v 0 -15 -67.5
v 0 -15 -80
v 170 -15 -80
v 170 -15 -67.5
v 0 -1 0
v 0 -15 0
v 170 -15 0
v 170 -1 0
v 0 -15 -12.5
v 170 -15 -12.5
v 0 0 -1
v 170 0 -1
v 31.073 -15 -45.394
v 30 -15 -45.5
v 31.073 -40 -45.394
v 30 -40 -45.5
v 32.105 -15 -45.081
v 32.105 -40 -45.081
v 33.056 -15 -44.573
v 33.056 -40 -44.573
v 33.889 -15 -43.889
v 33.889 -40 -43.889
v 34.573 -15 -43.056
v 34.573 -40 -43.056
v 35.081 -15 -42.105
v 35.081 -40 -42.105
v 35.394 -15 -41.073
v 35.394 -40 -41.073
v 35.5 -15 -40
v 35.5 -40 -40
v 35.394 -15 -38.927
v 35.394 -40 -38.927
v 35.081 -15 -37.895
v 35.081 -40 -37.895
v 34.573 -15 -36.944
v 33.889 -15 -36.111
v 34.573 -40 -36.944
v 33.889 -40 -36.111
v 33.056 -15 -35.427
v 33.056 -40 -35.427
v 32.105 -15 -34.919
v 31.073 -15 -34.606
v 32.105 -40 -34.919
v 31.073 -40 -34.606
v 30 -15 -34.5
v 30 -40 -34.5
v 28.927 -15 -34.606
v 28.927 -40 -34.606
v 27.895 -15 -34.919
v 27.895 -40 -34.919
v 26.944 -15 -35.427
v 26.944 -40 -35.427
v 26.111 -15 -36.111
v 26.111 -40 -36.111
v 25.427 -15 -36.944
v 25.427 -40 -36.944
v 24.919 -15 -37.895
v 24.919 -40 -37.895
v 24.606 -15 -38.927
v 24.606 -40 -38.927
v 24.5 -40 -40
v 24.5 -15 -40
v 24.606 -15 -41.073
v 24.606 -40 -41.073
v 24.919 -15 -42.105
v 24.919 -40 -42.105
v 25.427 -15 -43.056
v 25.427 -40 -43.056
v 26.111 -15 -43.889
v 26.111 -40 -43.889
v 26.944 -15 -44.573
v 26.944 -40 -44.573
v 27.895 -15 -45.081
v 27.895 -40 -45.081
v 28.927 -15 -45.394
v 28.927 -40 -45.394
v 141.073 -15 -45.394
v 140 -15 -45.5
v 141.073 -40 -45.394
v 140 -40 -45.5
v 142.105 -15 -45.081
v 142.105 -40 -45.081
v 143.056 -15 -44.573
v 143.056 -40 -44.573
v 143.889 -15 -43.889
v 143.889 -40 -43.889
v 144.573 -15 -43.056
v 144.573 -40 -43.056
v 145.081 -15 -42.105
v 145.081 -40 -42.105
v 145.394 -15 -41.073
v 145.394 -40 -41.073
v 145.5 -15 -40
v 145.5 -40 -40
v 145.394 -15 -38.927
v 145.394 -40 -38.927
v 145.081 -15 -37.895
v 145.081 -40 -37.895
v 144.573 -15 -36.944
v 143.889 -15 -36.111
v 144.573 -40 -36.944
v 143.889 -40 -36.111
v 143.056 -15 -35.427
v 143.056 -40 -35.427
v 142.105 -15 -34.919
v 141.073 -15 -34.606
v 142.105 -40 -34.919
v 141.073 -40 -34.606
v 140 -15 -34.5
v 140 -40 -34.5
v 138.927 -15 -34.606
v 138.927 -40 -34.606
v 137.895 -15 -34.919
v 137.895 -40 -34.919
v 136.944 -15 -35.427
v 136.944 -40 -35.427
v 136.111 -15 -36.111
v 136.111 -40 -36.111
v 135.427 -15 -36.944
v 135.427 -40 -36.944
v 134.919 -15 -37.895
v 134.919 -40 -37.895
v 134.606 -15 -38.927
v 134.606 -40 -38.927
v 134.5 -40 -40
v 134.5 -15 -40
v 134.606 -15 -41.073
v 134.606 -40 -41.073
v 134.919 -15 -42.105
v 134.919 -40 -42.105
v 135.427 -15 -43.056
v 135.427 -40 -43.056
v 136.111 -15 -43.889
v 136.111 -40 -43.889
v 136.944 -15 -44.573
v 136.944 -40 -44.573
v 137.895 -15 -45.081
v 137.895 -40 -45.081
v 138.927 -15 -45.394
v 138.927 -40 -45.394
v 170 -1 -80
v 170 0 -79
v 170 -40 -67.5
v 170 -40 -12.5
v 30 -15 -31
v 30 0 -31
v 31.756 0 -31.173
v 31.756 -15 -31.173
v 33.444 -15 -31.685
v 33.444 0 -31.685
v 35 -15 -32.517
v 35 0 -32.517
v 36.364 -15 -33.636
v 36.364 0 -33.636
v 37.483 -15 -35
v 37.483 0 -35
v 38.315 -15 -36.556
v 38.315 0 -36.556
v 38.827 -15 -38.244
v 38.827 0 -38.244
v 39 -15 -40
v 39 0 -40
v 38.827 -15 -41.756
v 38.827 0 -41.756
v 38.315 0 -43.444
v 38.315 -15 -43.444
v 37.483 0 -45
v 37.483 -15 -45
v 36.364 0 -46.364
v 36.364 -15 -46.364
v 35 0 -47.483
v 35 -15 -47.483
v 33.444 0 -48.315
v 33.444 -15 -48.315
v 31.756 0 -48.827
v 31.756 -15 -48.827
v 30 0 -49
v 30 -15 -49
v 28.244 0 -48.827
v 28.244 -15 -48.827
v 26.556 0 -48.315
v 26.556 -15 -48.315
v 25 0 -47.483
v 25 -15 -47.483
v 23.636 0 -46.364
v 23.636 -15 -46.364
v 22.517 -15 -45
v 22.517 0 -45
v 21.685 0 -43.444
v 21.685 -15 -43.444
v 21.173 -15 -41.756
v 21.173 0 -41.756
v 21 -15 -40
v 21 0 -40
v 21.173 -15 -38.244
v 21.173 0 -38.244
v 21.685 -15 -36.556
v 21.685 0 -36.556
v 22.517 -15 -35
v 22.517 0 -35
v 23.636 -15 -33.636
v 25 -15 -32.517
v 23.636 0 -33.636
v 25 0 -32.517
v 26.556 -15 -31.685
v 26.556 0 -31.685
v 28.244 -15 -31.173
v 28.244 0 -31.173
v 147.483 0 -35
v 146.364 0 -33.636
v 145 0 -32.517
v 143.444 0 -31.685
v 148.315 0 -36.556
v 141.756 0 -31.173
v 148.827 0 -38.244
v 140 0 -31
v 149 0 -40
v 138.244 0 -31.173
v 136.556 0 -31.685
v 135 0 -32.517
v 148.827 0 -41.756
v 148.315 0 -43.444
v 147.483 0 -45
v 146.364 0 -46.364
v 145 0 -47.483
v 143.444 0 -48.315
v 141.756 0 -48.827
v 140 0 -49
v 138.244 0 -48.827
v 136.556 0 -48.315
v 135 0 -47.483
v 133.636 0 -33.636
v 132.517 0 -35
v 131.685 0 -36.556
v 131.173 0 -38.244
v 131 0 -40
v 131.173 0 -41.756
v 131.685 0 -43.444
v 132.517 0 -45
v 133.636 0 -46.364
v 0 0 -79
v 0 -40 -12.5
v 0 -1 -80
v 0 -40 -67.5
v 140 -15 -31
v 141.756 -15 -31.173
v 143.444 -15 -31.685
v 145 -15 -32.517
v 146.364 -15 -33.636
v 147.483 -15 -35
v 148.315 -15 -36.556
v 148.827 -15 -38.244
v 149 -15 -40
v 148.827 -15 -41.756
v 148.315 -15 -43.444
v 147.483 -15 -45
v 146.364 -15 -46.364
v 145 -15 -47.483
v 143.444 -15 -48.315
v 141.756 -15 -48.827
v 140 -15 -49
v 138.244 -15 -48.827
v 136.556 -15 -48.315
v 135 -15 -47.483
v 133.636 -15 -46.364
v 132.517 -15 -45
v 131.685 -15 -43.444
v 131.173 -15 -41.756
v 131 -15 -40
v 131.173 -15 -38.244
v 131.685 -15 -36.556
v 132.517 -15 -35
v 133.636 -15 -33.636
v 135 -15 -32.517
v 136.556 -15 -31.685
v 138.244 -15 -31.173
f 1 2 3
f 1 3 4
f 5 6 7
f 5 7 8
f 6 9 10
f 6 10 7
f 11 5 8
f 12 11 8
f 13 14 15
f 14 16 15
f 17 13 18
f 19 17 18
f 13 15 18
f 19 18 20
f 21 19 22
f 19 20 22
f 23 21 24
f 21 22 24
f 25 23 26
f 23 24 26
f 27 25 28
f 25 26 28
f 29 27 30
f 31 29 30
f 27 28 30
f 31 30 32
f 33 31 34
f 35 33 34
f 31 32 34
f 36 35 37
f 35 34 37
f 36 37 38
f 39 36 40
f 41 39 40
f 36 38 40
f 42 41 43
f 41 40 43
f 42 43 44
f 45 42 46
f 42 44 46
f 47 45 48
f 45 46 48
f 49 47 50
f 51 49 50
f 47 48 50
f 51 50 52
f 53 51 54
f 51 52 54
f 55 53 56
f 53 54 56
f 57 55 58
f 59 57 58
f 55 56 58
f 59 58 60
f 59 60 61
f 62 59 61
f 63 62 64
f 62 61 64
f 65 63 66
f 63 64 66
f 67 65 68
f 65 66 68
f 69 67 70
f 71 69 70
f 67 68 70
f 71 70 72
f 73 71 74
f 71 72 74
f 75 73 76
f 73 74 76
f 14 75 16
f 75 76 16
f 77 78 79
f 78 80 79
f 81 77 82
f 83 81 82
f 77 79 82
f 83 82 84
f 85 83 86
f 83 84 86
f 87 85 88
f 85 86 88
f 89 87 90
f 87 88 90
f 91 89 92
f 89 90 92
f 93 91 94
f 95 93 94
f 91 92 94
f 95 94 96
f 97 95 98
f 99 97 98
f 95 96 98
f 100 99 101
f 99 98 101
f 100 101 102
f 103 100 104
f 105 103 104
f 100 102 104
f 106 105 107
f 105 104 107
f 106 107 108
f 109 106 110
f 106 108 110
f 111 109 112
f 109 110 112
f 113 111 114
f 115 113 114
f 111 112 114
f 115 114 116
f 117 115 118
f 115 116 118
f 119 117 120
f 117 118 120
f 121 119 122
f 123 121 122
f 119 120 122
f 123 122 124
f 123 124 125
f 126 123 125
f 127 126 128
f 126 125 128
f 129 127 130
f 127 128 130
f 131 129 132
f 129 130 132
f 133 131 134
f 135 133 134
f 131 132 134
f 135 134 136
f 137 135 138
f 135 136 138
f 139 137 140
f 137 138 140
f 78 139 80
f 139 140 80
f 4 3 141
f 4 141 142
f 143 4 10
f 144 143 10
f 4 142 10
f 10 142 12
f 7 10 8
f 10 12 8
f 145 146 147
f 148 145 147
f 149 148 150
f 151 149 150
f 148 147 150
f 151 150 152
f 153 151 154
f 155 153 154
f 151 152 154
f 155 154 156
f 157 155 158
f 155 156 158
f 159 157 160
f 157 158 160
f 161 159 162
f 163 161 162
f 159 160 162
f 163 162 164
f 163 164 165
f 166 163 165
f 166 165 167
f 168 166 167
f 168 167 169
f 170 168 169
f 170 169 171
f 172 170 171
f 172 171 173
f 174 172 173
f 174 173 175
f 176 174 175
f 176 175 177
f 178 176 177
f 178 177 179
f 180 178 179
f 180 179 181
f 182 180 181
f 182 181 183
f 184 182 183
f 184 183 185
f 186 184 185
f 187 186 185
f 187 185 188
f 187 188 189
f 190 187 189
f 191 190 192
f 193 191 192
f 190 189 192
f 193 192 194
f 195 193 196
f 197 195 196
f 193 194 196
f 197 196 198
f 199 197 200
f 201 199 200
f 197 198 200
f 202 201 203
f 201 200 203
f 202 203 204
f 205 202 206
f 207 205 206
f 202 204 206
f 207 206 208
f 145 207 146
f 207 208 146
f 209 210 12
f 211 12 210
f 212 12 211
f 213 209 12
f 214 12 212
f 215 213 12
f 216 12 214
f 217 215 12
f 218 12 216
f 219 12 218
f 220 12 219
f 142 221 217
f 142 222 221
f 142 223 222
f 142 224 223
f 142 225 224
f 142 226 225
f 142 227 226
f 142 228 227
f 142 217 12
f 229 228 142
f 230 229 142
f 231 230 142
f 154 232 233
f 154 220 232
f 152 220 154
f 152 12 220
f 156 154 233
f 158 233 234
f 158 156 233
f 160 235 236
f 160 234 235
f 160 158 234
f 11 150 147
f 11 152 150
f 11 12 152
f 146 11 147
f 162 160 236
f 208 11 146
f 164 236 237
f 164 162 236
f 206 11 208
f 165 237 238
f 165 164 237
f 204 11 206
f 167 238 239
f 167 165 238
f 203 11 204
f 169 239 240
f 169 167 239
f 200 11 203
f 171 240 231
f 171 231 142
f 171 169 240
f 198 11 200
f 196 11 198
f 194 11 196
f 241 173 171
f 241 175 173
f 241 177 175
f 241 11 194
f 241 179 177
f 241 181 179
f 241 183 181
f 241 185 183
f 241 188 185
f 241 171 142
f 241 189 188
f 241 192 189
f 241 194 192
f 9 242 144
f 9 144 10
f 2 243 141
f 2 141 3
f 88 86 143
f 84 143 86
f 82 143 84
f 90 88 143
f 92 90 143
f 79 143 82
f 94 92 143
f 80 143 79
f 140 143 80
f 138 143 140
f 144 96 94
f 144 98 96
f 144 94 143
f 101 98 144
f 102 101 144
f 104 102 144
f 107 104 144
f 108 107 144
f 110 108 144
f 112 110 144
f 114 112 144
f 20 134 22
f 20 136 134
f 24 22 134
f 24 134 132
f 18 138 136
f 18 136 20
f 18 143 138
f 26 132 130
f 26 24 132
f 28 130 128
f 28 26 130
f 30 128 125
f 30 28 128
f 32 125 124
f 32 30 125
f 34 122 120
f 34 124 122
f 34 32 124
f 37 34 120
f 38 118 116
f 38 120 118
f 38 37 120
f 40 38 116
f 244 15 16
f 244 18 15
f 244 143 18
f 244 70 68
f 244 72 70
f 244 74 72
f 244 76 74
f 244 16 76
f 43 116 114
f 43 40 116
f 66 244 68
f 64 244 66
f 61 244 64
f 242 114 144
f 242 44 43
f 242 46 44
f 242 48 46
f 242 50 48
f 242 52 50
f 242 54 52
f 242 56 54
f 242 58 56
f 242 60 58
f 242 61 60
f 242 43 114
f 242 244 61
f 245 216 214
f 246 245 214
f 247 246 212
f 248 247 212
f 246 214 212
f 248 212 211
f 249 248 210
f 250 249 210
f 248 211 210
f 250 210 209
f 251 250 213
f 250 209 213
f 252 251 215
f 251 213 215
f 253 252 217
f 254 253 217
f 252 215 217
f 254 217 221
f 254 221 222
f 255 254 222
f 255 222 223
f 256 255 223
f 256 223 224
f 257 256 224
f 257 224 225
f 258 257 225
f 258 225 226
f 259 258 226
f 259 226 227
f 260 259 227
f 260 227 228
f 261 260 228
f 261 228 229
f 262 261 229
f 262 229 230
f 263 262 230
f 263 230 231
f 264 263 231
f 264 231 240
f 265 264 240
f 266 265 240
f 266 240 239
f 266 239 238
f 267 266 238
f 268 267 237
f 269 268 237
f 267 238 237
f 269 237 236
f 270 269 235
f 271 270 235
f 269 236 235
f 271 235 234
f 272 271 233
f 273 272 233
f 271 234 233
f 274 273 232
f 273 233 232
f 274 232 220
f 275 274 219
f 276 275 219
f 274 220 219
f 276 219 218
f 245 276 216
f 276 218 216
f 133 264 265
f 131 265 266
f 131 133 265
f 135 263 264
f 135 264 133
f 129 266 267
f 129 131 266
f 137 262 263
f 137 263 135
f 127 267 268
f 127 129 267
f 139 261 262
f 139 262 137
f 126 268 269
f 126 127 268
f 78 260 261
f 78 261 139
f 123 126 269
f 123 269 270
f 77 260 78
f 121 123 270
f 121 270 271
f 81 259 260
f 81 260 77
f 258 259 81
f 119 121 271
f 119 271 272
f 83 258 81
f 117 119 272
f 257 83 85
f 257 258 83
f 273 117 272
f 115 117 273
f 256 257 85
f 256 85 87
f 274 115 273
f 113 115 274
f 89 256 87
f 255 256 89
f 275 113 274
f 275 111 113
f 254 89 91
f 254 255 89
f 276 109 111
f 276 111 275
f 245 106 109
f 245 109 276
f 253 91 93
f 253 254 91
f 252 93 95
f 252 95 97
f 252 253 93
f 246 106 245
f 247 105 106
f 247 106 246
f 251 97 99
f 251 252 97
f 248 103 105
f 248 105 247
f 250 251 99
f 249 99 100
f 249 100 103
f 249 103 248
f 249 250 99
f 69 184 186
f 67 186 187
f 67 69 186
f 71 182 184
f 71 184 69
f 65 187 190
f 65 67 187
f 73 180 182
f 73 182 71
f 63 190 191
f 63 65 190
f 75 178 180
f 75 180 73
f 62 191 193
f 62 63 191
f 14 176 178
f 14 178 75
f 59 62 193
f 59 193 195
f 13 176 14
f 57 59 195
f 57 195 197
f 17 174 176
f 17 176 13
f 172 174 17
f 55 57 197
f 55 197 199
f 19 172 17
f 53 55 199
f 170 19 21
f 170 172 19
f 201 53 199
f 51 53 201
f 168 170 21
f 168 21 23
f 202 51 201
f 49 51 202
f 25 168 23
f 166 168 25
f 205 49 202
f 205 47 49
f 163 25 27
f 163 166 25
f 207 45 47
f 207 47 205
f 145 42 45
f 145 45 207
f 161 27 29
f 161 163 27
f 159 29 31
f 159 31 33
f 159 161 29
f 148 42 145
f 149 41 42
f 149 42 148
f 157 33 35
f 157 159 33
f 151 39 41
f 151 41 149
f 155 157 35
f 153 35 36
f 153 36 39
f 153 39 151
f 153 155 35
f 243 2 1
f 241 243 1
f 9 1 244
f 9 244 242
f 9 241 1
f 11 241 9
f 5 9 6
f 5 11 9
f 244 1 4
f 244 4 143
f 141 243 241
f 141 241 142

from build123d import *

# Parameters (mm, degrees)
EXTRUDE_1_DEPTH           = 170
HOLE_WIZARD_1_D           = 11
HOLE_WIZARD_1_CBORE_D     = 18
HOLE_WIZARD_1_CBORE_DEPTH = 15
CHAMFER_1_SIZE            = 1


with BuildPart() as part:
    # 草图2 → 凸台-拉伸1 (new body)
    with BuildSketch(Plane(origin=(0, 0, 0), x_dir=(0, 0, -1), z_dir=(1, 0, 0))):
        Polygon((0, 0), (80, 0), (80, -15), (67.5, -15), (67.5, -40), (12.5, -40), (12.5, -15), (0, -15), align=None)
    extrude(amount=EXTRUDE_1_DEPTH)

    # 孔1 (through all)
    with Locations(Plane(origin=(30, 0, -40), x_dir=(0, 0, 1), z_dir=(0, 1, 0))):
        with Locations((0, 0), (0, 110)):
            CounterBoreHole(HOLE_WIZARD_1_D / 2, HOLE_WIZARD_1_CBORE_D / 2, HOLE_WIZARD_1_CBORE_DEPTH)

    # 倒角1
    chamfer_1_edges = [part.edges().sort_by_distance(p)[0] for p in [
        (85, 0, 0),
        (85, 0, -80),
    ]]
    chamfer(chamfer_1_edges, length=CHAMFER_1_SIZE)


solid = part.part
